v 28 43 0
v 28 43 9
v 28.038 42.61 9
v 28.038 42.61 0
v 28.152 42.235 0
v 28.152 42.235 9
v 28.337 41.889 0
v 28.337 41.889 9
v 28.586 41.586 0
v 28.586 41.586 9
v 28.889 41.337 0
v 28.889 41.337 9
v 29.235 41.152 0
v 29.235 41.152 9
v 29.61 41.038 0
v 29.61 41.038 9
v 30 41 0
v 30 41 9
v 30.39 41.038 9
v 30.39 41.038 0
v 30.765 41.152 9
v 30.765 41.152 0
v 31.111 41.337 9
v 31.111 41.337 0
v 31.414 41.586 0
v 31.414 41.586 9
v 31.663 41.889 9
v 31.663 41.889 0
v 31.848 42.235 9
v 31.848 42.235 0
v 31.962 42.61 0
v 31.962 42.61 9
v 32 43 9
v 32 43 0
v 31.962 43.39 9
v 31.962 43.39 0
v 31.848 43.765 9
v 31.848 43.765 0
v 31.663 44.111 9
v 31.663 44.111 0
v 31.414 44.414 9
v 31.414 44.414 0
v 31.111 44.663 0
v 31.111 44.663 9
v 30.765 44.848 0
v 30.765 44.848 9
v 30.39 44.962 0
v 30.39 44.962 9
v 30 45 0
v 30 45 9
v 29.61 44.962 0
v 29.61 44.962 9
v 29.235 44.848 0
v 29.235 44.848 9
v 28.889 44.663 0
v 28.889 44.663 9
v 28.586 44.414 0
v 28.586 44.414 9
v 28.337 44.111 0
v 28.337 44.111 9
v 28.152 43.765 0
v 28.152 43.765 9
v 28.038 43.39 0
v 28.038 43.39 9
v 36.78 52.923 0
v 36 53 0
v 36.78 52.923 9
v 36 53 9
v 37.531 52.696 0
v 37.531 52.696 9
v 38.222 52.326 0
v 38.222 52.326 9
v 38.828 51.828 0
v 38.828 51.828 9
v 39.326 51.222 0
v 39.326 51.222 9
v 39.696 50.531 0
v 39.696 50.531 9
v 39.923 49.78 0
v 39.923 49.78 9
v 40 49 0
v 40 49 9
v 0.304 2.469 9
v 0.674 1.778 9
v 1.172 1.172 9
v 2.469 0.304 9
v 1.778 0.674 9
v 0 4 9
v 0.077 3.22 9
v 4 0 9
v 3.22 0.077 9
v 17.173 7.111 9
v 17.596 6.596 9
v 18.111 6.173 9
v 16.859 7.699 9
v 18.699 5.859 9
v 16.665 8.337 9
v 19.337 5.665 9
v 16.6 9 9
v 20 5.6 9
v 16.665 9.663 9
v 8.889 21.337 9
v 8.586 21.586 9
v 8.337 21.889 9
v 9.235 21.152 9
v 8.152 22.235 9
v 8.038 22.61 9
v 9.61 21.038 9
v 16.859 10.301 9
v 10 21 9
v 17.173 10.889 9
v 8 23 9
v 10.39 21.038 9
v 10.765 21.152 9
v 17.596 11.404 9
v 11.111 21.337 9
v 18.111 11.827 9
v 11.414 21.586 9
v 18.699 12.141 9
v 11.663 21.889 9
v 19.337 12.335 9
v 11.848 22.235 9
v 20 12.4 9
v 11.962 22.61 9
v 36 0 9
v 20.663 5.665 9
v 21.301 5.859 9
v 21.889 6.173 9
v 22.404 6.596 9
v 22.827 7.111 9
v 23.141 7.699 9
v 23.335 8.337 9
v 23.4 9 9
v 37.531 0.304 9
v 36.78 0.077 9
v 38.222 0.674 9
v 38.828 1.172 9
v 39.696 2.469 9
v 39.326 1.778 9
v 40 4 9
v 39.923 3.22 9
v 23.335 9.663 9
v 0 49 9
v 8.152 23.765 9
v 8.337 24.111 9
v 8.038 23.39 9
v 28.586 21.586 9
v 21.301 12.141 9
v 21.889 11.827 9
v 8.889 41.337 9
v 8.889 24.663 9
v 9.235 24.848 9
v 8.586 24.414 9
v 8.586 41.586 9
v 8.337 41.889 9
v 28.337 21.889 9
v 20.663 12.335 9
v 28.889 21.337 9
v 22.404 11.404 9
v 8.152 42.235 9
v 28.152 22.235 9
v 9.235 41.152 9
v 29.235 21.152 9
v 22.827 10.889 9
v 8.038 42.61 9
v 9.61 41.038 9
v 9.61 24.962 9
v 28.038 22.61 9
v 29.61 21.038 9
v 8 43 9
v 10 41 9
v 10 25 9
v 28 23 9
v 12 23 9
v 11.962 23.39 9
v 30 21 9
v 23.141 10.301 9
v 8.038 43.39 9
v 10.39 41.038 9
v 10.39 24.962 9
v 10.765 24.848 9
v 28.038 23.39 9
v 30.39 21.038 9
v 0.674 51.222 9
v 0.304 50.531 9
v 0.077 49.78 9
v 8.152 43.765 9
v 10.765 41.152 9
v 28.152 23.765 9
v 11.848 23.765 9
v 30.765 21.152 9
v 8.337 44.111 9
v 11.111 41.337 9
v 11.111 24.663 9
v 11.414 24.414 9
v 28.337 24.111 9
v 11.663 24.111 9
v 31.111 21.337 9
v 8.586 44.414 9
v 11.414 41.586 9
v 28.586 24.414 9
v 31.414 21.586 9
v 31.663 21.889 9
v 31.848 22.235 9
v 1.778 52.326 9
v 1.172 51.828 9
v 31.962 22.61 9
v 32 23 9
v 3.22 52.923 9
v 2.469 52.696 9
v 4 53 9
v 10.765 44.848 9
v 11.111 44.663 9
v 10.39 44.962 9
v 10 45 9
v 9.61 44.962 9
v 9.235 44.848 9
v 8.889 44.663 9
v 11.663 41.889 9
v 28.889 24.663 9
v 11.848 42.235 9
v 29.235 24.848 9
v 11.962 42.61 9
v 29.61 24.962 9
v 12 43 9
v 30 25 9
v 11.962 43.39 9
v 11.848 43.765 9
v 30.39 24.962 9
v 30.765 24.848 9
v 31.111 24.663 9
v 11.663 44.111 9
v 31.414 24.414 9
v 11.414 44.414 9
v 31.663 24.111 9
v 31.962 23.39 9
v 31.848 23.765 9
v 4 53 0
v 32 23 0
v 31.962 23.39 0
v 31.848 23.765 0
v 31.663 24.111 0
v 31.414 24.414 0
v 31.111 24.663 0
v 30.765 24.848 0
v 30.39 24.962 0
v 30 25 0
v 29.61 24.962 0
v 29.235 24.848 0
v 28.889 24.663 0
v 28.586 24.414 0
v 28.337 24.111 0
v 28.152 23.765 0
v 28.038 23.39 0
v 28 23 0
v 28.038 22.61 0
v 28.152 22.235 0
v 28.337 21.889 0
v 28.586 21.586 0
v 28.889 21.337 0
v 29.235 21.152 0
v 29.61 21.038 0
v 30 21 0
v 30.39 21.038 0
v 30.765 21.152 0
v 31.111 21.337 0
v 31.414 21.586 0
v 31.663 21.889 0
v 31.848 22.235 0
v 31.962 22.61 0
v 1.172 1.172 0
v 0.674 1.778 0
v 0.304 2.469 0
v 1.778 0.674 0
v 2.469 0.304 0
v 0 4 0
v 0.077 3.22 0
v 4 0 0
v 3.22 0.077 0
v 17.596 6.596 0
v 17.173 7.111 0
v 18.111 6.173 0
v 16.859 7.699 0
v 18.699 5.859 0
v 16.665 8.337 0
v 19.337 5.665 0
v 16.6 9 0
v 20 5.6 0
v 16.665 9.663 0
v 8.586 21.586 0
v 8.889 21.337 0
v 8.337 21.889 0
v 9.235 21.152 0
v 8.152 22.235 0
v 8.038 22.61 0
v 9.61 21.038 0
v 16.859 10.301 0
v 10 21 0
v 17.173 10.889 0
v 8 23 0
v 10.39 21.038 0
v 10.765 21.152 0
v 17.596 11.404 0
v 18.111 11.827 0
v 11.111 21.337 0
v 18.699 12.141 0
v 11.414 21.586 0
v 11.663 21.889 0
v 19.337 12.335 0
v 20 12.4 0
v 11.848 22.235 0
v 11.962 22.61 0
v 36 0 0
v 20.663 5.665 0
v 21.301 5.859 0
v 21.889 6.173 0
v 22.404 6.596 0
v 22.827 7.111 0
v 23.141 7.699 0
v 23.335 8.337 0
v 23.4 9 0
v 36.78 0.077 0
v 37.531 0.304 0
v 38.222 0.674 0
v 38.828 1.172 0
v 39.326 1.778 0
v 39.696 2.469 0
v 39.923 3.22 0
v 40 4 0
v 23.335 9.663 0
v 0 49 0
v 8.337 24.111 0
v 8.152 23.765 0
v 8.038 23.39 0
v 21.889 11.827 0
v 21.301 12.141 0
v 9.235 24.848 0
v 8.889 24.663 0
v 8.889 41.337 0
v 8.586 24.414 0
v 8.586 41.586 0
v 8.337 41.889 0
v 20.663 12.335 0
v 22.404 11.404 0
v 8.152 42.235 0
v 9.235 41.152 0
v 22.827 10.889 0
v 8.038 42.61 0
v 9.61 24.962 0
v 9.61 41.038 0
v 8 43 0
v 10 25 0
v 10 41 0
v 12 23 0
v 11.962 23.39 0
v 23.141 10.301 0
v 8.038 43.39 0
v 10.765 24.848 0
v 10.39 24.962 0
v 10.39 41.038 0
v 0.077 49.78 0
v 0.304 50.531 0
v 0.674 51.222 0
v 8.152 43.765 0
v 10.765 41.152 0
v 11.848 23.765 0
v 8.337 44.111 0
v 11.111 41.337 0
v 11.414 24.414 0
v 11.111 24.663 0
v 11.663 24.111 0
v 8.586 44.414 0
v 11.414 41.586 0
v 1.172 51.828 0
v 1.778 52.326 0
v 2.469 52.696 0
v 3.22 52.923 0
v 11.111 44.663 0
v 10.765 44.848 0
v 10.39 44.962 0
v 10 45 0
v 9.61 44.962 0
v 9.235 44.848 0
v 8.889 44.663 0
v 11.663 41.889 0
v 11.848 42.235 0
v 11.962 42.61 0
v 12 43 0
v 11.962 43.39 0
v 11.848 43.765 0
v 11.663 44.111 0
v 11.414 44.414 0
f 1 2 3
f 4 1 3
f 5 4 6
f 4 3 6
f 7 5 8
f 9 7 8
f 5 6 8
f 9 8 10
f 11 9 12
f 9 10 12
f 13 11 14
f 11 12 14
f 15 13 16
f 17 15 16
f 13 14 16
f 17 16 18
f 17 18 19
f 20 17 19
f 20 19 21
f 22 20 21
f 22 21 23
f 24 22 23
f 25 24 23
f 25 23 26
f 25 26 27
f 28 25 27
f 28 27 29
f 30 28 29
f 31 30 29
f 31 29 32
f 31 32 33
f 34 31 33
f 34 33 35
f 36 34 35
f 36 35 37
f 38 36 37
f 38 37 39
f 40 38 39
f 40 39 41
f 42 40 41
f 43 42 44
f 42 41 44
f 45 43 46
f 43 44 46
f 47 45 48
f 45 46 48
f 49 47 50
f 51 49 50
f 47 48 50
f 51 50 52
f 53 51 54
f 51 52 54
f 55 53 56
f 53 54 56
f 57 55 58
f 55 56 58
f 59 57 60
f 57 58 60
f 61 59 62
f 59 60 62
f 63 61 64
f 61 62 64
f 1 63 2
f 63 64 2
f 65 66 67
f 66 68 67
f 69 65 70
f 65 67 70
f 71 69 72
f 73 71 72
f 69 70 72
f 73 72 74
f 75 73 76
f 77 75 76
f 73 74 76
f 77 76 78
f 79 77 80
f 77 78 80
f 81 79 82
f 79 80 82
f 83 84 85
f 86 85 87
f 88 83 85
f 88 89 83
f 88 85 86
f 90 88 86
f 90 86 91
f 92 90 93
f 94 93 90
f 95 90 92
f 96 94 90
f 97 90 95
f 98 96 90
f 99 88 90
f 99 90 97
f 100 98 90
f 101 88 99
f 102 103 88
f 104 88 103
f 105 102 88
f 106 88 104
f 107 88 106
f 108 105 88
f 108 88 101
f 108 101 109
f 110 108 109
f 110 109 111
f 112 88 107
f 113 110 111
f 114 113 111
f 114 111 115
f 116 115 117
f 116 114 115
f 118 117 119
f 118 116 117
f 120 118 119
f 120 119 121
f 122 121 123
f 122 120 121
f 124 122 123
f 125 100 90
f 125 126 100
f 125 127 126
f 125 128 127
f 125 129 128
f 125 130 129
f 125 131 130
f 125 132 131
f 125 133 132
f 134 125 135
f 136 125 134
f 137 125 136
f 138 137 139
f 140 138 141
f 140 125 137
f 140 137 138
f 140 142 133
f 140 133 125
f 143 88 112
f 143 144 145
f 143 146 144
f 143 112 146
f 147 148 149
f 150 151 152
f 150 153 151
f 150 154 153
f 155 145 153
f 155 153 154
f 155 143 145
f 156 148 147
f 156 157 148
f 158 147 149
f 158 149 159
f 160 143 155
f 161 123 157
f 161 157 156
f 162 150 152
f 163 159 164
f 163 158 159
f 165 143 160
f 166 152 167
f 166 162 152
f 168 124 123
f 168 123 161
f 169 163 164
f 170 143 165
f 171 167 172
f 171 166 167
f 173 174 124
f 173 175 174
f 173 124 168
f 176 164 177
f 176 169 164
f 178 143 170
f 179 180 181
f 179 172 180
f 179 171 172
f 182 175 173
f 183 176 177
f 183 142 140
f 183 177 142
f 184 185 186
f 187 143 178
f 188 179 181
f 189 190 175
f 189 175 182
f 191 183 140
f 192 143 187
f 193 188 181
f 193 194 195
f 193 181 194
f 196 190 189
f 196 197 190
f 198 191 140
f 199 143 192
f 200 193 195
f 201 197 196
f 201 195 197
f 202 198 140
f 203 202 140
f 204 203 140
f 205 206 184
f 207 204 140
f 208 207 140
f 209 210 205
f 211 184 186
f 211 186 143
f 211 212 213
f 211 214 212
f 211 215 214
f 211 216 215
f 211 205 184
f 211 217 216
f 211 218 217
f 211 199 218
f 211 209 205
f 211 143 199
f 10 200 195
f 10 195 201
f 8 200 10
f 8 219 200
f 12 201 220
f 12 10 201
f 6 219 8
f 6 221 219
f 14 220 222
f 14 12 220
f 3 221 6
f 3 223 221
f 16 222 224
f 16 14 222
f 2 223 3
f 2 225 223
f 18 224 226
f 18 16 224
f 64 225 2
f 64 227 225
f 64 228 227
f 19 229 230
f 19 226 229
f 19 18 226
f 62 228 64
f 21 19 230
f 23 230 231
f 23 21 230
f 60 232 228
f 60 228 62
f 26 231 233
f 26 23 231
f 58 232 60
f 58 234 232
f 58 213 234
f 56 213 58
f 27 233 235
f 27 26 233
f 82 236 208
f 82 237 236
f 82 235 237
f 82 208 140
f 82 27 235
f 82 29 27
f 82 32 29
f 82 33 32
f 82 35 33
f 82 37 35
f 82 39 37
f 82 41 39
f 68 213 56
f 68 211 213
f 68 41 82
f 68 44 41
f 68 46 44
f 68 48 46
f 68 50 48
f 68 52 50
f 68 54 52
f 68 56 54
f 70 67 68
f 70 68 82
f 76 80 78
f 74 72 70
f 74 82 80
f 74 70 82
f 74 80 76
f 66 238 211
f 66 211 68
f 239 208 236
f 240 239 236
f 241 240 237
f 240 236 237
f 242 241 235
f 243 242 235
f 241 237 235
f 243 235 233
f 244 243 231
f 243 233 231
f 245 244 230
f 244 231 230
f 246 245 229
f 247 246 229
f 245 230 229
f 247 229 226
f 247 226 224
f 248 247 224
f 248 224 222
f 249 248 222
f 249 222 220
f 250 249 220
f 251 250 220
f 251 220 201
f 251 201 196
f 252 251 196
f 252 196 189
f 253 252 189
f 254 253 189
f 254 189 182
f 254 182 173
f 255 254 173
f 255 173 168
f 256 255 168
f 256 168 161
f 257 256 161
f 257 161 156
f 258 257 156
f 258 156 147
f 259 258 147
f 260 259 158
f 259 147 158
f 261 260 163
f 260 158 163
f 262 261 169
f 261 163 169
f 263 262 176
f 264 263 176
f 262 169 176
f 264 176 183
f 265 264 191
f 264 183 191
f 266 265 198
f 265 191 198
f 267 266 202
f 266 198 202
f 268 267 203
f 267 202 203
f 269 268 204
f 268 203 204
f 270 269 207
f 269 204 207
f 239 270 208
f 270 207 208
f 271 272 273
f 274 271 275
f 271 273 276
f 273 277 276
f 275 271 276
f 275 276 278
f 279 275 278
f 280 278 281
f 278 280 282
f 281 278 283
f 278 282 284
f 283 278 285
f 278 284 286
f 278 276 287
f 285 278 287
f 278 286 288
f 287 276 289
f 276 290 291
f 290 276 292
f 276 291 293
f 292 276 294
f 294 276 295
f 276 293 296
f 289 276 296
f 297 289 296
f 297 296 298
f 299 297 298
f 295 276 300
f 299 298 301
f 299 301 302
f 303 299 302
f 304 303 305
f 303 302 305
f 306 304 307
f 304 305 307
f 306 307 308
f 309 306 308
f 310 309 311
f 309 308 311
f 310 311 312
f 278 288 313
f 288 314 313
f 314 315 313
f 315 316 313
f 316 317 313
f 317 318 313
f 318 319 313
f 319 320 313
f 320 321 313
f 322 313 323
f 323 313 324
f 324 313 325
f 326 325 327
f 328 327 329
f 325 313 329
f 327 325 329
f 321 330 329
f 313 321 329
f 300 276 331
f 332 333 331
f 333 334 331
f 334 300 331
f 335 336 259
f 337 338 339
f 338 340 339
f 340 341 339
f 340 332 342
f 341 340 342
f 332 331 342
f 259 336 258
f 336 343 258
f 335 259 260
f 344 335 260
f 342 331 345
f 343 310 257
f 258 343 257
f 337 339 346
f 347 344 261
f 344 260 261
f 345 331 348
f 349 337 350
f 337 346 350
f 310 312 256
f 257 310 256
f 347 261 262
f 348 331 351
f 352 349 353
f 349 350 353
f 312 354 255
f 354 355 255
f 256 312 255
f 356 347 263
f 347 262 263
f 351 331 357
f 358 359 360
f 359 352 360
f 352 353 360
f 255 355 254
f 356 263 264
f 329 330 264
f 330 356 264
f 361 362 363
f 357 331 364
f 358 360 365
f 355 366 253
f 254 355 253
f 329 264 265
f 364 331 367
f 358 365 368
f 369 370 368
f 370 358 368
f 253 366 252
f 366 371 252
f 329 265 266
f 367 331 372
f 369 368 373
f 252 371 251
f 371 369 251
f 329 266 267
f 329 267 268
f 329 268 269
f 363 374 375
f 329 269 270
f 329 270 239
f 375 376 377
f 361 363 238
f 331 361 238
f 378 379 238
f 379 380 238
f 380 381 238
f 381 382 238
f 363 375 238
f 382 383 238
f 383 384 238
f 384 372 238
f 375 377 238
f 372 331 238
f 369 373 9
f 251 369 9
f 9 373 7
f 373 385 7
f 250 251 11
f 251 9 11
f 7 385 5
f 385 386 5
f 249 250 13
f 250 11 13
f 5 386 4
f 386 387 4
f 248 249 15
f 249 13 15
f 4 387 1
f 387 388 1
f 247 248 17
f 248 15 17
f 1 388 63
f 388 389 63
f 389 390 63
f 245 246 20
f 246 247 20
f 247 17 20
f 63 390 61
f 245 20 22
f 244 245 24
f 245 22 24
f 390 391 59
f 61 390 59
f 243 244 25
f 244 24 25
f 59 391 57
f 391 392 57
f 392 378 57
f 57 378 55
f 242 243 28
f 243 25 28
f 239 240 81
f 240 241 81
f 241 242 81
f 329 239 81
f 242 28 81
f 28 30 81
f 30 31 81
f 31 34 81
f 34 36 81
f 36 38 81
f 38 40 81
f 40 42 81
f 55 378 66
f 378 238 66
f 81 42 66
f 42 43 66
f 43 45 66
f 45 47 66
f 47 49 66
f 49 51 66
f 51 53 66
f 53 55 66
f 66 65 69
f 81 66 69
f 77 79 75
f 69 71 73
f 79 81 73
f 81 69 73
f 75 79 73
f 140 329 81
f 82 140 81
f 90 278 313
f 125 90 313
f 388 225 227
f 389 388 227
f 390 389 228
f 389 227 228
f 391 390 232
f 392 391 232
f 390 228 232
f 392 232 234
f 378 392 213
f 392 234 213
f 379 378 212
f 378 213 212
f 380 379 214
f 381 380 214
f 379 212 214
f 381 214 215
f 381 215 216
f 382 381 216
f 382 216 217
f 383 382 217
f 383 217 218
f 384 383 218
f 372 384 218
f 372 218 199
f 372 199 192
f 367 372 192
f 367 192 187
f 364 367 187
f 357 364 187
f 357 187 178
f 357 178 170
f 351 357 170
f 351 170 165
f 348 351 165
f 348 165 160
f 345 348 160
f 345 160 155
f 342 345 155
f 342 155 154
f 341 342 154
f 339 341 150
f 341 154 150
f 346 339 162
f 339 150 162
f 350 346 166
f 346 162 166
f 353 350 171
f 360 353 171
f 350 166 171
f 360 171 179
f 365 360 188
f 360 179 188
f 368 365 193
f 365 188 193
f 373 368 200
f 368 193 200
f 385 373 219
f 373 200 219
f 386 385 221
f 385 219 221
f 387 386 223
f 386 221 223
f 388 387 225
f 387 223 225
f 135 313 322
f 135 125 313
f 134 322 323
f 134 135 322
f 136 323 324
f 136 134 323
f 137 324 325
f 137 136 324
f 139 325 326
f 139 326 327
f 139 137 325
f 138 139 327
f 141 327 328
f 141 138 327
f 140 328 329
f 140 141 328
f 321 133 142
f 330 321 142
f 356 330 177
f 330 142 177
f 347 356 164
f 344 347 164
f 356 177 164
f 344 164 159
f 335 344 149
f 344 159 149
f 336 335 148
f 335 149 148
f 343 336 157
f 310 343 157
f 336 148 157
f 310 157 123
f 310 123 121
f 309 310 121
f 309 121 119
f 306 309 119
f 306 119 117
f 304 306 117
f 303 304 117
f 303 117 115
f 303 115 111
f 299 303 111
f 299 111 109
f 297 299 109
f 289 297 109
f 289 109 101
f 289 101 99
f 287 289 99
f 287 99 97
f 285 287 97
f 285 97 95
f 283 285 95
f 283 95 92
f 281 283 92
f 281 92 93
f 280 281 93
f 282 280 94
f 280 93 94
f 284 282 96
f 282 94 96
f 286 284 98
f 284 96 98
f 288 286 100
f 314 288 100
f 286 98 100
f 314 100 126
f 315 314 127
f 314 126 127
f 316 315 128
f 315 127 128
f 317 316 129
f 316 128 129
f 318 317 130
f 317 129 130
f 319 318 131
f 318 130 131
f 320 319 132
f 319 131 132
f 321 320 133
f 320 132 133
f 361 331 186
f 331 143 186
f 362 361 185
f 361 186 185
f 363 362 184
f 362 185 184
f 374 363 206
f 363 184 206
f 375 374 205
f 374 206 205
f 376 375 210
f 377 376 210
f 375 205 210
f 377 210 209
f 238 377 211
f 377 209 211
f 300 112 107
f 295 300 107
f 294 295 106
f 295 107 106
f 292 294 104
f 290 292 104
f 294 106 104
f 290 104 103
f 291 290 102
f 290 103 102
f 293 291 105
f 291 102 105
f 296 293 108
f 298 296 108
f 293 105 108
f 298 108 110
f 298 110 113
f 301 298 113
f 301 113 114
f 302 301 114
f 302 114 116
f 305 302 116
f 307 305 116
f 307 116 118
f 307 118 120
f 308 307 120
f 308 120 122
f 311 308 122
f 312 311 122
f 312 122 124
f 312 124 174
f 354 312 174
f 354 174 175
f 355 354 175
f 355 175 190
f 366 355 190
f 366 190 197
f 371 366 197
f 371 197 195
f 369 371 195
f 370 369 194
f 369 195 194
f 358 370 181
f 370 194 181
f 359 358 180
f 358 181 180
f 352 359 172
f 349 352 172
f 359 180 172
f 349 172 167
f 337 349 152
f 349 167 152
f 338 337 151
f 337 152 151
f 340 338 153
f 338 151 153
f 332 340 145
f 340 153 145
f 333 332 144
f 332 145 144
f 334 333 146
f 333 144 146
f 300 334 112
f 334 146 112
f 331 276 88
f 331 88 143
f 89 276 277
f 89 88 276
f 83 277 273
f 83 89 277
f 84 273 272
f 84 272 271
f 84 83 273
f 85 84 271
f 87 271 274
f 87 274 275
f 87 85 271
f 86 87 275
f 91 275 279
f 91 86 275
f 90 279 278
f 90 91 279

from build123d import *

# Parameters (mm, degrees)
ESQUISSE1_W             = 40
ESQUISSE1_H             = 53
BOSS_EXTRU_1_DEPTH      = 9
ESQUISSE2_R             = 2
ESQUISSE2_R_2           = 3.4
ENL_V_MAT_EXTRU_1_DEPTH = 68.007462271
CONG_1_R                = 4


with BuildPart() as part:
    # Esquisse1 → Boss.-Extru.1 (new body)
    with BuildSketch(Plane.XY):
        with Locations((20, 26.5)):
            Rectangle(ESQUISSE1_W, ESQUISSE1_H)
    extrude(amount=BOSS_EXTRU_1_DEPTH)

    # Esquisse2 → Enlèv. mat.-Extru.1 (cut, through all)
    with BuildSketch(Plane.XY.offset(9)):
        with Locations((10, 43)):
            Circle(ESQUISSE2_R)
        with Locations(Location((30, 43, 0), (0, 0, 180))):
            Circle(ESQUISSE2_R)
        with Locations((30, 23)):
            Circle(ESQUISSE2_R)
        with Locations(Location((10, 23, 0), (0, 0, 180))):
            Circle(ESQUISSE2_R)
        with Locations((20, 9)):
            Circle(ESQUISSE2_R_2)
    extrude(amount=-ENL_V_MAT_EXTRU_1_DEPTH, mode=Mode.SUBTRACT)

    # Congé1
    cong_1_edges = [part.edges().sort_by_distance(p)[0] for p in [
        (0, 53, 4.5),
        (40, 53, 4.5),
        (40, 0, 4.5),
        (0, 0, 4.5),
    ]]
    fillet(cong_1_edges, radius=CONG_1_R)


solid = part.part
